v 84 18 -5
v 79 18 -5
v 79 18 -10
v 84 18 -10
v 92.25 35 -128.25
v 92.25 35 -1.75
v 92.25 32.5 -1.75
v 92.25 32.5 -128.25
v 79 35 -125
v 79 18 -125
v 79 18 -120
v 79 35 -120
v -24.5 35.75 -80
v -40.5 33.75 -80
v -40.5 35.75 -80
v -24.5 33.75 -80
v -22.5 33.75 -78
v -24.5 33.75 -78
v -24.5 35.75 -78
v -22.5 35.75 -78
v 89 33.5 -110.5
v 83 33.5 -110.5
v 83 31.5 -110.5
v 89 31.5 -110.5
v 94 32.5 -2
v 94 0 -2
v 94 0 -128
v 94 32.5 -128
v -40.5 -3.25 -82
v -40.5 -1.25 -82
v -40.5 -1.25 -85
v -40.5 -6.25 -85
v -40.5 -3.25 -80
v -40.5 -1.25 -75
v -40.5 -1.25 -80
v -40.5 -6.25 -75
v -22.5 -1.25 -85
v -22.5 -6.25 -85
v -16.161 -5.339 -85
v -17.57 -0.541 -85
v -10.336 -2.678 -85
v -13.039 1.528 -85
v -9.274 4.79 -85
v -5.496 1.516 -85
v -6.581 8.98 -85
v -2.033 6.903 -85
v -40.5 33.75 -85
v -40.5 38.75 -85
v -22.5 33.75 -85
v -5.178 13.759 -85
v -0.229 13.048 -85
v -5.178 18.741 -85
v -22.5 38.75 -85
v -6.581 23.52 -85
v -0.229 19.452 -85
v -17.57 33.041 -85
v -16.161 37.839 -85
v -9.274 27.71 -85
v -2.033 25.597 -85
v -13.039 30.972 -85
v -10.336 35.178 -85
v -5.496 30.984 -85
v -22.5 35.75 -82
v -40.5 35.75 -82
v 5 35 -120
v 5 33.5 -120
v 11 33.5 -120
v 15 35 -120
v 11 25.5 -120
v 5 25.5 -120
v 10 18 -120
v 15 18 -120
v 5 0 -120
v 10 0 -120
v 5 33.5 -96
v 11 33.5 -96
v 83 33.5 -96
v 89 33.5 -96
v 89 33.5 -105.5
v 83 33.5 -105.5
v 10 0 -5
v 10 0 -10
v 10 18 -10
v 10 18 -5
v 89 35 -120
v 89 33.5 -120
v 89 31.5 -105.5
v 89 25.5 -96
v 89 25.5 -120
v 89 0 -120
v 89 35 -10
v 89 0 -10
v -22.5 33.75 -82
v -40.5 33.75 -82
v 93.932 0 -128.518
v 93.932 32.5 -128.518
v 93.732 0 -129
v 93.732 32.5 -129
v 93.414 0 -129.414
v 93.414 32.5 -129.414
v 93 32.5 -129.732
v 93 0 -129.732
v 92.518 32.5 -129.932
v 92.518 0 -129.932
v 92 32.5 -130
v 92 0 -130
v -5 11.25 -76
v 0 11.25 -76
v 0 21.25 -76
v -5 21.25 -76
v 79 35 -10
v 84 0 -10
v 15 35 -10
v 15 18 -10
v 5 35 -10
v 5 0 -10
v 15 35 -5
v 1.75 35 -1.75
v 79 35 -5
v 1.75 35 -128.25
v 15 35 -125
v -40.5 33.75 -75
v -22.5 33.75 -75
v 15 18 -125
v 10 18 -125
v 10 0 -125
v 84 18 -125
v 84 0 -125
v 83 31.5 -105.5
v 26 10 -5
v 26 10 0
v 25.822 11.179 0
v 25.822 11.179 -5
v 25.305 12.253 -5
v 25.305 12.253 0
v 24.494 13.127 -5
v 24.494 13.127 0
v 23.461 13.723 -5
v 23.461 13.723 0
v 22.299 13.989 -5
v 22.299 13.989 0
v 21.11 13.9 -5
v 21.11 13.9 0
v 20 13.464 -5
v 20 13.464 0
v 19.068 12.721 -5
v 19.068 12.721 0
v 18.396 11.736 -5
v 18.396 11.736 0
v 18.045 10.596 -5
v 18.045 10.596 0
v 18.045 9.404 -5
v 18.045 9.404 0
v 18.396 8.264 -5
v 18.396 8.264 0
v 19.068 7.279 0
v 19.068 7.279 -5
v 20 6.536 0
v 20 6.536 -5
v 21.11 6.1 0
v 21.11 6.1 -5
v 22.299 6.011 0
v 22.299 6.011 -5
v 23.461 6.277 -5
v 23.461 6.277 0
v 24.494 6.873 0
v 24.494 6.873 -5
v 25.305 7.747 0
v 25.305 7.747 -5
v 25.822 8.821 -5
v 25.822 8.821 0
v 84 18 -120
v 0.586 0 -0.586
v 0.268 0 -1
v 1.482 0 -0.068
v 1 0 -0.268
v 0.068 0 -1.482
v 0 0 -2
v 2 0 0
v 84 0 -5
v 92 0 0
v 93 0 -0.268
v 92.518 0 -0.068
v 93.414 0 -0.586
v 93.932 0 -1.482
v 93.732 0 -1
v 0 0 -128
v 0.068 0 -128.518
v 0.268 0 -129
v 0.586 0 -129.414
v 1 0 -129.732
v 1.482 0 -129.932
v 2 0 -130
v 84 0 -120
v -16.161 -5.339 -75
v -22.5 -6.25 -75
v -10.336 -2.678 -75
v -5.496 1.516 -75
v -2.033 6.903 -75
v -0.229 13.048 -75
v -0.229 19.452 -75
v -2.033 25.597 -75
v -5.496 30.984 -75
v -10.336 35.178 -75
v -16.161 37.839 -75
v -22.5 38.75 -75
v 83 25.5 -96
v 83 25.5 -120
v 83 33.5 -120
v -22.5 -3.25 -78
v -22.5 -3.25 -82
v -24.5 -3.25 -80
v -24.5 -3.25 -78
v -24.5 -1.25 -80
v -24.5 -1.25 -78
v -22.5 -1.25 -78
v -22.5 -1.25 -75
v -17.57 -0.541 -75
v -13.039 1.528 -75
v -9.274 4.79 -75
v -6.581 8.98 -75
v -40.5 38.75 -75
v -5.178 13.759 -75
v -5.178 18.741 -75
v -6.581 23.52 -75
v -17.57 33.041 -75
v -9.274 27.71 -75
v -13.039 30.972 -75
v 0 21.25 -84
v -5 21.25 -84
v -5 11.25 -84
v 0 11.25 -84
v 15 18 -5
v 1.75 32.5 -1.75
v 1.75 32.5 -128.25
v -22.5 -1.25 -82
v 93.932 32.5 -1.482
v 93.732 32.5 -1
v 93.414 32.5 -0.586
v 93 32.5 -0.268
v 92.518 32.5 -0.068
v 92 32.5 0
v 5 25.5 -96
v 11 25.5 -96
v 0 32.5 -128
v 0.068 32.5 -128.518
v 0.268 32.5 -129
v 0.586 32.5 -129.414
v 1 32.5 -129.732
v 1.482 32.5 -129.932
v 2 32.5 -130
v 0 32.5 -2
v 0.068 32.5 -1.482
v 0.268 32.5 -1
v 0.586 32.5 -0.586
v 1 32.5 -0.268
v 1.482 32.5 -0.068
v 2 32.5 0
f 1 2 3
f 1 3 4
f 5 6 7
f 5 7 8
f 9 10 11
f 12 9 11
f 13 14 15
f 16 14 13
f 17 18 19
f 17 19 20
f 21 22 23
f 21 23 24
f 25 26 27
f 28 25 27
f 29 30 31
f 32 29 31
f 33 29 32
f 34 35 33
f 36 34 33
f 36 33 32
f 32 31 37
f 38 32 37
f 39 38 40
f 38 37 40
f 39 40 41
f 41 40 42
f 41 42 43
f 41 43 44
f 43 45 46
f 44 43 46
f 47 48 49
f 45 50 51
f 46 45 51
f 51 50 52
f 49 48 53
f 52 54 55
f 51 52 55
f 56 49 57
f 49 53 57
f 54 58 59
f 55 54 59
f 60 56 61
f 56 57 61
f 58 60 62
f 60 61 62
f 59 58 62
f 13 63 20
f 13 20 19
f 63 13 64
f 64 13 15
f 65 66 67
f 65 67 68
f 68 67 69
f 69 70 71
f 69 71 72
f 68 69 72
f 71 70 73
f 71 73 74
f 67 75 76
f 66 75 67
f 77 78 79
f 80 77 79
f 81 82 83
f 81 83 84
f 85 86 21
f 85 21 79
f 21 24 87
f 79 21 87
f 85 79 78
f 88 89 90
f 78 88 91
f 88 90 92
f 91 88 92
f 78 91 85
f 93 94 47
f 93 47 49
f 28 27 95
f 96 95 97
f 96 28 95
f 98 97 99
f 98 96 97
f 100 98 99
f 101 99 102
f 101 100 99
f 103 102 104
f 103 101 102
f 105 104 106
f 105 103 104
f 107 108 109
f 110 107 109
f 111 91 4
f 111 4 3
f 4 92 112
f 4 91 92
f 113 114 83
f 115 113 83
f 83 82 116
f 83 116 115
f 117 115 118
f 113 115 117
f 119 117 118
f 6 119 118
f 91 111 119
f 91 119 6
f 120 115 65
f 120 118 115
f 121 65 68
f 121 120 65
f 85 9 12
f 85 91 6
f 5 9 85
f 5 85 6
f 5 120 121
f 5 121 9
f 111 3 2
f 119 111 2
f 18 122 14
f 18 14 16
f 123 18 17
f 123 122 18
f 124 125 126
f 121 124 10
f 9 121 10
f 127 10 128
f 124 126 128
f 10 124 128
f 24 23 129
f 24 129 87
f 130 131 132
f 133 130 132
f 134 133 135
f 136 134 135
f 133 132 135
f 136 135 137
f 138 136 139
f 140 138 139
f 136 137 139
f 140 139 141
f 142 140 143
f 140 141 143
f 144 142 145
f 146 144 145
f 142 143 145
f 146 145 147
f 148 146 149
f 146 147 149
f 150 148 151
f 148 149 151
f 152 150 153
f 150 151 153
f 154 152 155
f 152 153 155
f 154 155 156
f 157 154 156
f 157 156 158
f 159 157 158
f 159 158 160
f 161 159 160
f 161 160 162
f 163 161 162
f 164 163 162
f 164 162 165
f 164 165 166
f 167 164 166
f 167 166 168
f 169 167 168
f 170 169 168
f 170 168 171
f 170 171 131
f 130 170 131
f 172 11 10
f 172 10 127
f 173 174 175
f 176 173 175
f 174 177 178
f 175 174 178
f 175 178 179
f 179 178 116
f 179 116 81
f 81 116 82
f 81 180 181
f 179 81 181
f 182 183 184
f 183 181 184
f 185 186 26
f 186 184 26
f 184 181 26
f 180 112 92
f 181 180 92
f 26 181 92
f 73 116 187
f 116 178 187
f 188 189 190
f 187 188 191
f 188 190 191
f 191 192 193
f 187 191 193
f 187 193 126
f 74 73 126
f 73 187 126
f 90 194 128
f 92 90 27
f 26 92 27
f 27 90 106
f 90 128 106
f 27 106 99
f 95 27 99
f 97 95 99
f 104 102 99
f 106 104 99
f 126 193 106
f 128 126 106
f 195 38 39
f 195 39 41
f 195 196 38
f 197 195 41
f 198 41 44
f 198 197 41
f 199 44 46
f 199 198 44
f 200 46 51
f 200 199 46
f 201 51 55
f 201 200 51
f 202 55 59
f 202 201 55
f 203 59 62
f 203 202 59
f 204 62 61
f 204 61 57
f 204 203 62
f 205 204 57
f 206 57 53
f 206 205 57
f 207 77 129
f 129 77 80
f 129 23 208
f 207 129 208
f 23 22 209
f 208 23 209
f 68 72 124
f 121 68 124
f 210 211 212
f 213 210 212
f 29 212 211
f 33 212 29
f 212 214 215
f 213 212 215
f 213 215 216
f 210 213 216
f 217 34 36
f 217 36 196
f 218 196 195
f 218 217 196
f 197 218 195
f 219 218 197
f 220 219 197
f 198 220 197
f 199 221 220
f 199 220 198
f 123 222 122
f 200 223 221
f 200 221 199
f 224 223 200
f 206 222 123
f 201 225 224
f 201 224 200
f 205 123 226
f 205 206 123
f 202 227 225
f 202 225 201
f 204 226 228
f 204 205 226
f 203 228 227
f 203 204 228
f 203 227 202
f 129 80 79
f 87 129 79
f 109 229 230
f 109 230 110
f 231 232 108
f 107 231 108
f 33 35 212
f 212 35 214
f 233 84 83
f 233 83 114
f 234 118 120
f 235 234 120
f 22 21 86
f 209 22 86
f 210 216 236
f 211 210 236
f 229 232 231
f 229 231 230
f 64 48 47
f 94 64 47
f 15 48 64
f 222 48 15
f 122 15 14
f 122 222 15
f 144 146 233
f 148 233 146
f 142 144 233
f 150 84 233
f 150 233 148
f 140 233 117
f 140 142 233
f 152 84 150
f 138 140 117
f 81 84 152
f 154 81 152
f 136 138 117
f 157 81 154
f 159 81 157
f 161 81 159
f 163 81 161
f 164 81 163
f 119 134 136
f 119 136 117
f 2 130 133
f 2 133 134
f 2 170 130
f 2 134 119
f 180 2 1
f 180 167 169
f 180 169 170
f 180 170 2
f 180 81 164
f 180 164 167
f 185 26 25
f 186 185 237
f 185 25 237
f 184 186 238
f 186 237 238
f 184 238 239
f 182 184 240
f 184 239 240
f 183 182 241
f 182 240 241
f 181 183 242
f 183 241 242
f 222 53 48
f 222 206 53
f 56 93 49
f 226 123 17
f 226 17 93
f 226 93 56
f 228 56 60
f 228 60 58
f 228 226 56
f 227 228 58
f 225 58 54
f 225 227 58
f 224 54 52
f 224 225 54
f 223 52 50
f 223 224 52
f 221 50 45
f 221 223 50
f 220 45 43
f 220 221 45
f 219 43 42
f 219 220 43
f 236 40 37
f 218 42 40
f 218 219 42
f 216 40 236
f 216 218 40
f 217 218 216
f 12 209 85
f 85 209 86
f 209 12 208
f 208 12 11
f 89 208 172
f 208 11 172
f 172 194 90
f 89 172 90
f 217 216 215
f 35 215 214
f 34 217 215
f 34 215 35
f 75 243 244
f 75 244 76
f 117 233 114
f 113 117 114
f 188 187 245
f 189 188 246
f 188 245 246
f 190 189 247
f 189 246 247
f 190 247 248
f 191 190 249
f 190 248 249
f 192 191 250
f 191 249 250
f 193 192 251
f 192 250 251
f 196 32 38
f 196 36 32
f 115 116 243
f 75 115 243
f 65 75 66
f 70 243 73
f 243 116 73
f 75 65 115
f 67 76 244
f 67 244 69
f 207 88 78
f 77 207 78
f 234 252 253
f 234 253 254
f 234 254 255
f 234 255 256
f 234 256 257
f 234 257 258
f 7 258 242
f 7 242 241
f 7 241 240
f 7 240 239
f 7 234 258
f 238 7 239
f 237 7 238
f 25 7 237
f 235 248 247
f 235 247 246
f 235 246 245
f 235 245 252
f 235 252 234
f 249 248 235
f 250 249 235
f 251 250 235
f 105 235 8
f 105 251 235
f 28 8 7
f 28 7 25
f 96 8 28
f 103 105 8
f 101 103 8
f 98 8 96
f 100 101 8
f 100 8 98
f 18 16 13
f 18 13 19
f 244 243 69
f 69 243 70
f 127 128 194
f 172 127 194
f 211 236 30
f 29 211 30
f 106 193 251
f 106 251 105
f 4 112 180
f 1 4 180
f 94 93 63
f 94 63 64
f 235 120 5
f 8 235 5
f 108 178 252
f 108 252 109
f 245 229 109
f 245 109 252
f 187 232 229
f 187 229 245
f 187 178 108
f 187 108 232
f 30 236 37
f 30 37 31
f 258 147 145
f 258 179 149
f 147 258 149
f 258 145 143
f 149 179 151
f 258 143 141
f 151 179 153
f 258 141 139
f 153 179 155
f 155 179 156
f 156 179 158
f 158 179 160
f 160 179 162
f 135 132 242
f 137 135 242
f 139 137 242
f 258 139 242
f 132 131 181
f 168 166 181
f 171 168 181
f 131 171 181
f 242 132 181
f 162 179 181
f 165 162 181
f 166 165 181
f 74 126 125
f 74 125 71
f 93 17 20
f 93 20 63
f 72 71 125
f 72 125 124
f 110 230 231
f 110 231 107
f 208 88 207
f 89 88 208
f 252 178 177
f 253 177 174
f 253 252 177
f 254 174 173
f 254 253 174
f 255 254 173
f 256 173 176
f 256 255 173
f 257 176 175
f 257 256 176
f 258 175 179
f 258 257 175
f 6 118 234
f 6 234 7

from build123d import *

# Parameters (mm, degrees)
SKETCH1_W            = 94
SKETCH1_H            = 130
BOSS_EXTRUDE1_DEPTH  = 35
SKETCH3_W            = 24
SKETCH3_H            = 8
BOSS_EXTRUDE2_DEPTH  = 6
SKETCH4_W            = 6
SKETCH4_H            = 5
CUT_EXTRUDE1_DEPTH   = 2
SKETCH5_W            = 5
SKETCH5_H            = 5
CUT_EXTRUDE2_DEPTH   = 18
LPATTERN1_COUNT      = 2
LPATTERN1_PITCH      = 69
LPATTERN1_COUNT_DIR2 = 2
LPATTERN1_PITCH_DIR2 = 115
FILLET1_R            = 2
SKETCH6_R            = 4
CUT_EXTRUDE3_DEPTH   = 7
SKETCH7_W            = 90.5
SKETCH7_H            = 126.5
CUT_EXTRUDE4_DEPTH   = 2.5
SKETCH14_W           = 8
SKETCH14_H           = 10
BOSS_EXTRUDE6_DEPTH  = 5
BOSS_EXTRUDE9_DEPTH  = 5
CUT_EXTRUDE6_DEPTH   = 2


with BuildPart() as part:
    # Sketch1 → Boss-Extrude1 (new body)
    with BuildSketch(Plane(origin=(0, 0, 0), x_dir=(1, 0, 0), z_dir=(0, 1, 0))):
        with Locations((47, 65)):
            Rectangle(SKETCH1_W, SKETCH1_H)
        Polygon((79, 125), (79, 120), (89, 120), (89, 10), (79, 10), (79, 5), (15, 5), (15, 10), (5, 10), (5, 120), (15, 120), (15, 125), align=None, mode=Mode.SUBTRACT)
    extrude(amount=BOSS_EXTRUDE1_DEPTH)

    # Sketch3 → Boss-Extrude2 (add)
    with BuildSketch(Plane(origin=(5, 0, 0), x_dir=(0, 0, -1), z_dir=(1, 0, 0))):
        with Locations((108, 29.5)):
            Rectangle(SKETCH3_W, SKETCH3_H)
    boss_extrude2 = extrude(amount=BOSS_EXTRUDE2_DEPTH)

    # Mirror3: Boss-Extrude2 across plane
    add(boss_extrude2.mirror(Plane.ZY.offset(-47)))

    # Sketch4 → Cut-Extrude1 (cut)
    with BuildSketch(Plane(origin=(0, 33.5, 0), x_dir=(1, 0, 0), z_dir=(0, 1, 0))):
        with Locations((86, 108)):
            Rectangle(SKETCH4_W, SKETCH4_H)
    extrude(amount=-CUT_EXTRUDE1_DEPTH, mode=Mode.SUBTRACT)

    # Sketch5 → Cut-Extrude2 (cut)
    with BuildSketch(Plane.XZ):
        with Locations((81.5, -122.5)):
            Rectangle(SKETCH5_W, SKETCH5_H)
    cut_extrude2 = extrude(amount=-CUT_EXTRUDE2_DEPTH, mode=Mode.SUBTRACT)

    # LPattern1: Cut-Extrude2 2 × 2
    with Locations(*[(-i * LPATTERN1_PITCH, 0, j * LPATTERN1_PITCH_DIR2) for i in range(LPATTERN1_COUNT) for j in range(LPATTERN1_COUNT_DIR2) if (i, j) != (0, 0)]):
        add(cut_extrude2, mode=Mode.SUBTRACT)

    # Fillet1
    fillet1_edges = [part.edges().sort_by_distance(p)[0] for p in [
        (0, 17.5, -130),
        (94, 17.5, -130),
        (94, 17.5, 0),
        (0, 17.5, 0),
    ]]
    fillet(fillet1_edges, radius=FILLET1_R)

    # Sketch6 → Cut-Extrude3 (cut)
    with BuildSketch(Plane.XY):
        with Locations((22, 10)):
            Circle(SKETCH6_R)
    extrude(amount=-CUT_EXTRUDE3_DEPTH, mode=Mode.SUBTRACT)

    # Sketch7 → Cut-Extrude4 (cut)
    with BuildSketch(Plane(origin=(0, 35, 0), x_dir=(1, 0, 0), z_dir=(0, 1, 0))):
        with BuildLine():
            Line((94, 2), (94, 128))
            ThreePointArc((94, 128), (93.414213562, 129.414213562), (92, 130))
            Line((92, 130), (2, 130))
            ThreePointArc((2, 130), (0.585786438, 129.414213562), (0, 128))
            Line((0, 128), (0, 2))
            ThreePointArc((0, 2), (0.585786438, 0.585786438), (2, 0))
            Line((2, 0), (92, 0))
            ThreePointArc((92, 0), (93.414213562, 0.585786438), (94, 2))
        make_face()
        with Locations((47, 65)):
            Rectangle(SKETCH7_W, SKETCH7_H, mode=Mode.SUBTRACT)
    extrude(amount=-CUT_EXTRUDE4_DEPTH, mode=Mode.SUBTRACT)

    # Sketch14 → Boss-Extrude6 (add)
    with BuildSketch(Plane.ZY):
        with Locations((-80, 16.25)):
            Rectangle(SKETCH14_W, SKETCH14_H)
    extrude(amount=BOSS_EXTRUDE6_DEPTH)


with BuildPart() as body_2:
    # Sketch17 → Boss-Extrude9 (new body, symmetric)
    with BuildSketch(Plane.XY.offset(-80)):
        with BuildLine():
            Line((-22.5, 38.75), (-40.5, 38.75))
            Line((-40.5, 38.75), (-40.5, 33.75))
            Line((-40.5, 33.75), (-22.5, 33.75))
            ThreePointArc((-22.5, 33.75), (-5, 16.25), (-22.5, -1.25))
            Line((-22.5, -1.25), (-40.5, -1.25))
            Line((-40.5, -1.25), (-40.5, -6.25))
            Line((-40.5, -6.25), (-22.5, -6.25))
            ThreePointArc((-22.5, -6.25), (0, 16.25), (-22.5, 38.75))
        make_face()
    extrude(amount=BOSS_EXTRUDE9_DEPTH, both=True)

    # Sketch18 → Cut-Extrude6 (cut)
    with BuildSketch(Plane.XZ.offset(-33.75)):
        Polygon((-22.5, -82), (-40.5, -82), (-40.5, -80), (-24.5, -80), (-24.5, -78), (-22.5, -78), align=None)
    cut_extrude6 = extrude(amount=-CUT_EXTRUDE6_DEPTH, mode=Mode.SUBTRACT)

    # Mirror4: Cut-Extrude6 across plane
    add(cut_extrude6.mirror(Plane(origin=(0, 16.25, 0), x_dir=(0, 0, 1), z_dir=(0, -1, 0))), mode=Mode.SUBTRACT)


solid = Compound([part.part, body_2.part])
